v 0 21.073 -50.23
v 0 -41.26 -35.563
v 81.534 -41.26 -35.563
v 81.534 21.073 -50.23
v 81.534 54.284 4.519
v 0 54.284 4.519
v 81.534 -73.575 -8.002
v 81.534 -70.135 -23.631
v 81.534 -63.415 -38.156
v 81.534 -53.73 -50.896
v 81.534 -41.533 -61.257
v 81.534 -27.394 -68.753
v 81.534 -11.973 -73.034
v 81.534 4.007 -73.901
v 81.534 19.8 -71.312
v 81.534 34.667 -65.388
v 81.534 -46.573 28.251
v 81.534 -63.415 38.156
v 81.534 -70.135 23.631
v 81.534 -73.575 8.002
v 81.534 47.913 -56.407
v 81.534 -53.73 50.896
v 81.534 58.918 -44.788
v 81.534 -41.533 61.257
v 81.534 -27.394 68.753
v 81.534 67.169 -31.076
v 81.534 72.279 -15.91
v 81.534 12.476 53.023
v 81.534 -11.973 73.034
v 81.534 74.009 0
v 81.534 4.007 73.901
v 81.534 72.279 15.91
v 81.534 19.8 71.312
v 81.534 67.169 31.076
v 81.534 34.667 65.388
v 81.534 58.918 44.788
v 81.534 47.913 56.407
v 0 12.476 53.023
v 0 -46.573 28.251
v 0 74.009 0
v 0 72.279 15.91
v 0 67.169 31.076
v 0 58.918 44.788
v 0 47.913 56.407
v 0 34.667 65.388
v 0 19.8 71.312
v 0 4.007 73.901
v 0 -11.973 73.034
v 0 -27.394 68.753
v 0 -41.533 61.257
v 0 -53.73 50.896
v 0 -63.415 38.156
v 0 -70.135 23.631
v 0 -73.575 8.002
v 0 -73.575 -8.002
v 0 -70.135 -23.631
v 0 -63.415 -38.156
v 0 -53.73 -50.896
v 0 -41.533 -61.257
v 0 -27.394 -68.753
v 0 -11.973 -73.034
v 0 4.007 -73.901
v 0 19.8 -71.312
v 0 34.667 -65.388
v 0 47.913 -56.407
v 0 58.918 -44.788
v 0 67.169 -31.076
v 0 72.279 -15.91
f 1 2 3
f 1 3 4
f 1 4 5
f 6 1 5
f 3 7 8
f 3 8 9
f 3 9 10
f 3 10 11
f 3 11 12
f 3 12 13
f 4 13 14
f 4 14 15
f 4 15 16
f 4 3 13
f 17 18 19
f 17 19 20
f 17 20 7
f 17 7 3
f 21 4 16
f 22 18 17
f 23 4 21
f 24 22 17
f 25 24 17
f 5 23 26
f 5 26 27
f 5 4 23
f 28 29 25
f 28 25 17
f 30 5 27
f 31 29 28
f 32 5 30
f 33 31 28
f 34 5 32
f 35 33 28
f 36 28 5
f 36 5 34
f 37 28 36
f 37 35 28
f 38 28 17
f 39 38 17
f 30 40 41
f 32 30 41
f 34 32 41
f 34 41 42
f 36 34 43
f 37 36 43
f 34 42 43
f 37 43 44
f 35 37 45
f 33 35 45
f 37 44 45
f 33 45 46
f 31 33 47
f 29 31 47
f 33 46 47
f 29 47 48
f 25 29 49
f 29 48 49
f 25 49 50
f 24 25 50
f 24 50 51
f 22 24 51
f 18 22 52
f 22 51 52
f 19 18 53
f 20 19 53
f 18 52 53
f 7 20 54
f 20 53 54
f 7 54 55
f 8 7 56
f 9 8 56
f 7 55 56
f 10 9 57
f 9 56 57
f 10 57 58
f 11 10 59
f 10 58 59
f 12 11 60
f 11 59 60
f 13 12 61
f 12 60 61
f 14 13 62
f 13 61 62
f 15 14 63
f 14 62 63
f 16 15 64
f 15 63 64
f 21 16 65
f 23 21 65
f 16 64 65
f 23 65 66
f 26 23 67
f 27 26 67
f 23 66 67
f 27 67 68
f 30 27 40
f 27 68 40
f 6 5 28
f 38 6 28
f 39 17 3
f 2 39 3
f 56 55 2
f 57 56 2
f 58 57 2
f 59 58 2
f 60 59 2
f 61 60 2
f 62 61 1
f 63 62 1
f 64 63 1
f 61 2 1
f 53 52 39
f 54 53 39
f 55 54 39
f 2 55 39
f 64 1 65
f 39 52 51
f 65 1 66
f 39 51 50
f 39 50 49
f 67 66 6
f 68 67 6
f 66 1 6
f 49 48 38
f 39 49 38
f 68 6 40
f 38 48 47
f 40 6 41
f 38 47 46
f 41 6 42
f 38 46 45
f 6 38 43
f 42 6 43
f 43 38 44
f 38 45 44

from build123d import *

# Parameters (mm, degrees)
F0_R     = 74.009235
F1_DEPTH = 81.534
F3_DEPTH = 226.06


with BuildPart() as f1:
    # F0 (on Right) → F1 (new body)
    with BuildSketch(Plane.YZ):
        Circle(F0_R)
    extrude(amount=F1_DEPTH)

    # F2 (on face) → F3 (cut)
    with BuildSketch(Plane.YZ):
        Polygon((54.283541, 4.519317), (12.476411, 53.023261), (-46.572695, 28.250861), (-41.259919, -35.563269), (21.072662, -50.230169), align=None)
    extrude(amount=F3_DEPTH, mode=Mode.SUBTRACT)


solid = f1.part
